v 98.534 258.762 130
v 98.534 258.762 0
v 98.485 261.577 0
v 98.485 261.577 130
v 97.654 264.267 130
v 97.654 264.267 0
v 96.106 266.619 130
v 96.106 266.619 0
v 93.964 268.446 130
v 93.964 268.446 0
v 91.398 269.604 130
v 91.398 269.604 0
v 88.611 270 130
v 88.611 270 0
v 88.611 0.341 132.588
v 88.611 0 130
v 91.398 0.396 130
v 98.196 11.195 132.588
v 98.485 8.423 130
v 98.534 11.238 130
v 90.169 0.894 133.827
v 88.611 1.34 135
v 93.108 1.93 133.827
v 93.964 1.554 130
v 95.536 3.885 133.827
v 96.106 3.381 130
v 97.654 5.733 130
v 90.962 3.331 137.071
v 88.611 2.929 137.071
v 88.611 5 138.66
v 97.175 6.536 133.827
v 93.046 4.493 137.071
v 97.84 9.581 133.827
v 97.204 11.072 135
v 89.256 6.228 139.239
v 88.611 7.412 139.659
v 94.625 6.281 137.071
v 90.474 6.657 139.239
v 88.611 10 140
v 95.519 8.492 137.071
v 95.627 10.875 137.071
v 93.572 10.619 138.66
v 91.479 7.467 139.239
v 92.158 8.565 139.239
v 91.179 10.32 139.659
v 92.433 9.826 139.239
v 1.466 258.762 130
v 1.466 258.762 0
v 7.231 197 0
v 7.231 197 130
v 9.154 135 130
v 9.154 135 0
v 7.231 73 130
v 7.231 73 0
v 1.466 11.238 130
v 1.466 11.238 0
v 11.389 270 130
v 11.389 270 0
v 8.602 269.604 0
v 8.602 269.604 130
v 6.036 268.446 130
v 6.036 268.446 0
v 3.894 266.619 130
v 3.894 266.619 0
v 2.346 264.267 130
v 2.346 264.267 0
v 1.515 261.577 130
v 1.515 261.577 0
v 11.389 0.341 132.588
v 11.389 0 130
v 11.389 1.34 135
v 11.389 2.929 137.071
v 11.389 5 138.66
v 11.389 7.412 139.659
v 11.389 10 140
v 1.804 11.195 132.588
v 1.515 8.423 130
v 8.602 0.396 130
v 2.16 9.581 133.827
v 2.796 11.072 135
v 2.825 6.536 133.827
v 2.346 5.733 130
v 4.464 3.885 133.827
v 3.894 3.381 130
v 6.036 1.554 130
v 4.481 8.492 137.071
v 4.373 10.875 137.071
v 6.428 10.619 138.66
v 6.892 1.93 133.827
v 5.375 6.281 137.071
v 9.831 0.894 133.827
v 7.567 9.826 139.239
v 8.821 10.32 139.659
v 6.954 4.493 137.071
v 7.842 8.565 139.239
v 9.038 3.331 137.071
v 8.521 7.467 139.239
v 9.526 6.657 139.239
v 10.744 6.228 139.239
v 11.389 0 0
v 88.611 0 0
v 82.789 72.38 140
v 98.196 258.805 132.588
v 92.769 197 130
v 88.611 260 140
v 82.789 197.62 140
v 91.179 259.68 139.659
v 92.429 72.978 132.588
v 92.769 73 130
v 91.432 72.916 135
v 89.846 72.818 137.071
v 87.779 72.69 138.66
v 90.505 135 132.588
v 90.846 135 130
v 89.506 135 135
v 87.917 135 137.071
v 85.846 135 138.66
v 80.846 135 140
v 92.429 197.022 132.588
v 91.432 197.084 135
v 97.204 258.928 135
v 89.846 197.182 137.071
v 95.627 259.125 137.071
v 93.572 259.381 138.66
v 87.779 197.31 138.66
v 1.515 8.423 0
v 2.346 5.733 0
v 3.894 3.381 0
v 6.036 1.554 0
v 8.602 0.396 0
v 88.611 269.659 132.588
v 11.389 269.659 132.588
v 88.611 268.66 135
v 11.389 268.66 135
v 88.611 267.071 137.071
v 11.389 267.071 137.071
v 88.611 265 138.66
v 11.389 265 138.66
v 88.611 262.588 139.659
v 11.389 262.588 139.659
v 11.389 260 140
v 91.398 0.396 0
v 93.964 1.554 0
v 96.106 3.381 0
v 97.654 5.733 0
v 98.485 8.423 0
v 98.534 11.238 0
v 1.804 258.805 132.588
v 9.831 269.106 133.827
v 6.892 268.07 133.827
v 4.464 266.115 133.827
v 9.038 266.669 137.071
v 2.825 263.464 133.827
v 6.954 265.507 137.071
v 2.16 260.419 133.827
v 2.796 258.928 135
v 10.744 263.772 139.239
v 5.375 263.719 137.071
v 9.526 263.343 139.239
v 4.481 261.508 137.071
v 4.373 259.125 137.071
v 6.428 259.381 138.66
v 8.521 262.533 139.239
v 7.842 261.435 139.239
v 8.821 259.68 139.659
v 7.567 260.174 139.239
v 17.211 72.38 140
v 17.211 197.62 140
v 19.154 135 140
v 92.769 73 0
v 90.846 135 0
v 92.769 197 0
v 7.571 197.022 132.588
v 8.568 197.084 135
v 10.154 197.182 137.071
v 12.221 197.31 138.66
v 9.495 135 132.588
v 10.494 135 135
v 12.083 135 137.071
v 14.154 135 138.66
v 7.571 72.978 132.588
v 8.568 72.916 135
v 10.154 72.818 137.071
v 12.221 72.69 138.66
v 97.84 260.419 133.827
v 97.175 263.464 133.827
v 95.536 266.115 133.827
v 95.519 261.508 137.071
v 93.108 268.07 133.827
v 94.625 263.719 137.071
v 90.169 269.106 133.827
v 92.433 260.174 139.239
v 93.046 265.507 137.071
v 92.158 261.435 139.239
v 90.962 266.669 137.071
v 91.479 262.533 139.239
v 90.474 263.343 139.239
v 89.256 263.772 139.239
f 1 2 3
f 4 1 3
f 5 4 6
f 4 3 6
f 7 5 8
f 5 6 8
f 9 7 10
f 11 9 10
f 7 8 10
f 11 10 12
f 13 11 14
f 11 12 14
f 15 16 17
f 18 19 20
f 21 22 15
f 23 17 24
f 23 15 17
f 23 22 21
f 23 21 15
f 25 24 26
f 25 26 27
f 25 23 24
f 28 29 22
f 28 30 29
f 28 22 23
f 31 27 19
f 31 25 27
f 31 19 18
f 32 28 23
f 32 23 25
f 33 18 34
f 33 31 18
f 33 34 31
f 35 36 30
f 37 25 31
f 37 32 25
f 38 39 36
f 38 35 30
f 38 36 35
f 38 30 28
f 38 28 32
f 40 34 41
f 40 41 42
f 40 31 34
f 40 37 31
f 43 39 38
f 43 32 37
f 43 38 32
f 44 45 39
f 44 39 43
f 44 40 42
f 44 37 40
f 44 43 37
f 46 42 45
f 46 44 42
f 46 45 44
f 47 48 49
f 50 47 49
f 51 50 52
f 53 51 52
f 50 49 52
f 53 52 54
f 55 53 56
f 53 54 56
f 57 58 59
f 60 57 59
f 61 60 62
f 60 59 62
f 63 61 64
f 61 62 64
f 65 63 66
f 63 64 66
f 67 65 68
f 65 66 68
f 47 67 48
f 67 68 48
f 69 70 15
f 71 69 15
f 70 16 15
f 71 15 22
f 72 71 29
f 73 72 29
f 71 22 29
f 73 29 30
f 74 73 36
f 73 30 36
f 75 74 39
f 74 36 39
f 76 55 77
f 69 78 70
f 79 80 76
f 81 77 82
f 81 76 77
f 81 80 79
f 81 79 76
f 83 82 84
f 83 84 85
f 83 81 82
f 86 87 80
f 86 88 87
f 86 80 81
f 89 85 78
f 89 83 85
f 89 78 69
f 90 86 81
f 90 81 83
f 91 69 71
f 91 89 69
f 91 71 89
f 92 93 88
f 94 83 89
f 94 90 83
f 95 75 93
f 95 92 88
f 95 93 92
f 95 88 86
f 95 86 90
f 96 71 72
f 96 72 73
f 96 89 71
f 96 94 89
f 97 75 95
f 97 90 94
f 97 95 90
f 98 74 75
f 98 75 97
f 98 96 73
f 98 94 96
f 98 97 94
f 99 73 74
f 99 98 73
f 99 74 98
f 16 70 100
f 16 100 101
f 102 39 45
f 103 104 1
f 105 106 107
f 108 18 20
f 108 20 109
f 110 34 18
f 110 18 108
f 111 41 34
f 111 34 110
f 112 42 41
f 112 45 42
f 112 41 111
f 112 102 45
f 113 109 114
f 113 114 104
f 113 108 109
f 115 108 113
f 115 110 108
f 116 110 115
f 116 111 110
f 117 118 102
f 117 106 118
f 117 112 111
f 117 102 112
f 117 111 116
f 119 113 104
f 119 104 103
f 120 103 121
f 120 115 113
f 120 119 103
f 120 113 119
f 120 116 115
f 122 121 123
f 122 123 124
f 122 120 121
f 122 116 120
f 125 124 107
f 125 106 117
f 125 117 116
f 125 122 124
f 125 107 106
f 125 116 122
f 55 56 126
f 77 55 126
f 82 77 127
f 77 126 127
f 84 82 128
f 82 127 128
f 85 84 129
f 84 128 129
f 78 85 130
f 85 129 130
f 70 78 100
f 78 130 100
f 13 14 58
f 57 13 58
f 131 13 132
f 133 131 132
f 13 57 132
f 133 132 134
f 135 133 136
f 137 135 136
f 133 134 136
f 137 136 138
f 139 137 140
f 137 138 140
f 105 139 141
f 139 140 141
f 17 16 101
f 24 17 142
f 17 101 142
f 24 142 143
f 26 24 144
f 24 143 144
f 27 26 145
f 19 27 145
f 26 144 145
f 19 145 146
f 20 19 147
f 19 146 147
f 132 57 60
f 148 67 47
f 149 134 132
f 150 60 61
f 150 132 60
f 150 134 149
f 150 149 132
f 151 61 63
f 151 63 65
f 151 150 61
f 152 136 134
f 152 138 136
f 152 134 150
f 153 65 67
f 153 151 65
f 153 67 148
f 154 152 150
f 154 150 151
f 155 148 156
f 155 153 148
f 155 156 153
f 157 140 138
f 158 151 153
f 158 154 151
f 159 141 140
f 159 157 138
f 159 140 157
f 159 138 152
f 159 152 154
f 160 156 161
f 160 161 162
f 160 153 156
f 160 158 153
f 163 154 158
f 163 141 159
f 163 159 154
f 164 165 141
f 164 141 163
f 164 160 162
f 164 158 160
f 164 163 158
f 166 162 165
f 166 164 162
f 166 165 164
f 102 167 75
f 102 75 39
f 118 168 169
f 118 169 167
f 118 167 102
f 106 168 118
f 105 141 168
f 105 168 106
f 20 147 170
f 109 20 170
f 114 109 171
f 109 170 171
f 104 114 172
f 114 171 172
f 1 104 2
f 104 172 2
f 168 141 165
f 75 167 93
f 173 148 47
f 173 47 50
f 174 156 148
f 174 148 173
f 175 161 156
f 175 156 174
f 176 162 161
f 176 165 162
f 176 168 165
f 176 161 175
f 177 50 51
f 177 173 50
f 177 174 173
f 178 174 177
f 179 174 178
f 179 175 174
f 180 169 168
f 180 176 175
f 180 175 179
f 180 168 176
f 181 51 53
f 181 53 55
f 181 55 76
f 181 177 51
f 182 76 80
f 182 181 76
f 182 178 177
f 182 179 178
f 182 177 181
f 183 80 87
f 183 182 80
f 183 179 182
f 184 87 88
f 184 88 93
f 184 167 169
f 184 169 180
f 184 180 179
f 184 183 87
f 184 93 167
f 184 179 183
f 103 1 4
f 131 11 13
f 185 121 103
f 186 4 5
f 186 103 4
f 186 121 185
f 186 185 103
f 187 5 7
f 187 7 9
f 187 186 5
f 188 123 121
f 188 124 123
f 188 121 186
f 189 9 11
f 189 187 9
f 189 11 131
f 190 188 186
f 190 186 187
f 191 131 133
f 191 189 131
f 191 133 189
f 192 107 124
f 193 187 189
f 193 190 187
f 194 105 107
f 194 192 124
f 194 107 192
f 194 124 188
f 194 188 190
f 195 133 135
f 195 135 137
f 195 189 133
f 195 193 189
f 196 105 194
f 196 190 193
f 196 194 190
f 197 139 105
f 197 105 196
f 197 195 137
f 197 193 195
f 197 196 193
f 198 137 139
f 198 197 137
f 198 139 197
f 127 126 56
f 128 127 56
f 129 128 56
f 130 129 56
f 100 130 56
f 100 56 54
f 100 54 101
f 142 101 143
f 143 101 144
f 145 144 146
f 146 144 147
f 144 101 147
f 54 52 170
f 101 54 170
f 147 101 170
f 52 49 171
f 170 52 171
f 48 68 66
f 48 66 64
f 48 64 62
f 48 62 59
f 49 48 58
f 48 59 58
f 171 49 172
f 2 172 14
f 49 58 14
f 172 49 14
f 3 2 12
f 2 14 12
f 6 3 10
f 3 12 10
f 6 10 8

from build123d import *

# Parameters (mm, degrees)
F1_DEPTH = 140
F2_R     = 10


with BuildPart() as f1:
    # F0 (on Top) → F1 (new body)
    with BuildSketch(Plane.XY):
        with BuildLine():
            ThreePointArc((1.466285, 11.237624), (3.89353, 3.380946), (11.389404, 0))
            Line((11.389404, 0), (88.610596, 0))
            ThreePointArc((88.610596, 0), (96.10647, 3.380946), (98.533715, 11.237624))
            ThreePointArc((98.533715, 11.237624), (90.845598, 135), (98.533715, 258.762376))
            ThreePointArc((98.533715, 258.762376), (96.10647, 266.619054), (88.610596, 270))
            Line((88.610596, 270), (11.389404, 270))
            ThreePointArc((11.389404, 270), (3.89353, 266.619054), (1.466285, 258.762376))
            ThreePointArc((1.466285, 258.762376), (9.154402, 135), (1.466285, 11.237624))
        make_face()
    extrude(amount=F1_DEPTH)

    # F2
    f2_edges = [f1.edges().sort_by_distance(p)[0] for p in [
        (9.154402, 135, 140),
        (3.89353, 3.380946, 140),
        (50, 0, 140),
        (96.10647, 3.380946, 140),
        (90.845598, 135, 140),
        (96.10647, 266.619054, 140),
        (50, 270, 140),
        (3.89353, 266.619054, 140),
    ]]
    fillet(f2_edges, radius=F2_R)


solid = f1.part
